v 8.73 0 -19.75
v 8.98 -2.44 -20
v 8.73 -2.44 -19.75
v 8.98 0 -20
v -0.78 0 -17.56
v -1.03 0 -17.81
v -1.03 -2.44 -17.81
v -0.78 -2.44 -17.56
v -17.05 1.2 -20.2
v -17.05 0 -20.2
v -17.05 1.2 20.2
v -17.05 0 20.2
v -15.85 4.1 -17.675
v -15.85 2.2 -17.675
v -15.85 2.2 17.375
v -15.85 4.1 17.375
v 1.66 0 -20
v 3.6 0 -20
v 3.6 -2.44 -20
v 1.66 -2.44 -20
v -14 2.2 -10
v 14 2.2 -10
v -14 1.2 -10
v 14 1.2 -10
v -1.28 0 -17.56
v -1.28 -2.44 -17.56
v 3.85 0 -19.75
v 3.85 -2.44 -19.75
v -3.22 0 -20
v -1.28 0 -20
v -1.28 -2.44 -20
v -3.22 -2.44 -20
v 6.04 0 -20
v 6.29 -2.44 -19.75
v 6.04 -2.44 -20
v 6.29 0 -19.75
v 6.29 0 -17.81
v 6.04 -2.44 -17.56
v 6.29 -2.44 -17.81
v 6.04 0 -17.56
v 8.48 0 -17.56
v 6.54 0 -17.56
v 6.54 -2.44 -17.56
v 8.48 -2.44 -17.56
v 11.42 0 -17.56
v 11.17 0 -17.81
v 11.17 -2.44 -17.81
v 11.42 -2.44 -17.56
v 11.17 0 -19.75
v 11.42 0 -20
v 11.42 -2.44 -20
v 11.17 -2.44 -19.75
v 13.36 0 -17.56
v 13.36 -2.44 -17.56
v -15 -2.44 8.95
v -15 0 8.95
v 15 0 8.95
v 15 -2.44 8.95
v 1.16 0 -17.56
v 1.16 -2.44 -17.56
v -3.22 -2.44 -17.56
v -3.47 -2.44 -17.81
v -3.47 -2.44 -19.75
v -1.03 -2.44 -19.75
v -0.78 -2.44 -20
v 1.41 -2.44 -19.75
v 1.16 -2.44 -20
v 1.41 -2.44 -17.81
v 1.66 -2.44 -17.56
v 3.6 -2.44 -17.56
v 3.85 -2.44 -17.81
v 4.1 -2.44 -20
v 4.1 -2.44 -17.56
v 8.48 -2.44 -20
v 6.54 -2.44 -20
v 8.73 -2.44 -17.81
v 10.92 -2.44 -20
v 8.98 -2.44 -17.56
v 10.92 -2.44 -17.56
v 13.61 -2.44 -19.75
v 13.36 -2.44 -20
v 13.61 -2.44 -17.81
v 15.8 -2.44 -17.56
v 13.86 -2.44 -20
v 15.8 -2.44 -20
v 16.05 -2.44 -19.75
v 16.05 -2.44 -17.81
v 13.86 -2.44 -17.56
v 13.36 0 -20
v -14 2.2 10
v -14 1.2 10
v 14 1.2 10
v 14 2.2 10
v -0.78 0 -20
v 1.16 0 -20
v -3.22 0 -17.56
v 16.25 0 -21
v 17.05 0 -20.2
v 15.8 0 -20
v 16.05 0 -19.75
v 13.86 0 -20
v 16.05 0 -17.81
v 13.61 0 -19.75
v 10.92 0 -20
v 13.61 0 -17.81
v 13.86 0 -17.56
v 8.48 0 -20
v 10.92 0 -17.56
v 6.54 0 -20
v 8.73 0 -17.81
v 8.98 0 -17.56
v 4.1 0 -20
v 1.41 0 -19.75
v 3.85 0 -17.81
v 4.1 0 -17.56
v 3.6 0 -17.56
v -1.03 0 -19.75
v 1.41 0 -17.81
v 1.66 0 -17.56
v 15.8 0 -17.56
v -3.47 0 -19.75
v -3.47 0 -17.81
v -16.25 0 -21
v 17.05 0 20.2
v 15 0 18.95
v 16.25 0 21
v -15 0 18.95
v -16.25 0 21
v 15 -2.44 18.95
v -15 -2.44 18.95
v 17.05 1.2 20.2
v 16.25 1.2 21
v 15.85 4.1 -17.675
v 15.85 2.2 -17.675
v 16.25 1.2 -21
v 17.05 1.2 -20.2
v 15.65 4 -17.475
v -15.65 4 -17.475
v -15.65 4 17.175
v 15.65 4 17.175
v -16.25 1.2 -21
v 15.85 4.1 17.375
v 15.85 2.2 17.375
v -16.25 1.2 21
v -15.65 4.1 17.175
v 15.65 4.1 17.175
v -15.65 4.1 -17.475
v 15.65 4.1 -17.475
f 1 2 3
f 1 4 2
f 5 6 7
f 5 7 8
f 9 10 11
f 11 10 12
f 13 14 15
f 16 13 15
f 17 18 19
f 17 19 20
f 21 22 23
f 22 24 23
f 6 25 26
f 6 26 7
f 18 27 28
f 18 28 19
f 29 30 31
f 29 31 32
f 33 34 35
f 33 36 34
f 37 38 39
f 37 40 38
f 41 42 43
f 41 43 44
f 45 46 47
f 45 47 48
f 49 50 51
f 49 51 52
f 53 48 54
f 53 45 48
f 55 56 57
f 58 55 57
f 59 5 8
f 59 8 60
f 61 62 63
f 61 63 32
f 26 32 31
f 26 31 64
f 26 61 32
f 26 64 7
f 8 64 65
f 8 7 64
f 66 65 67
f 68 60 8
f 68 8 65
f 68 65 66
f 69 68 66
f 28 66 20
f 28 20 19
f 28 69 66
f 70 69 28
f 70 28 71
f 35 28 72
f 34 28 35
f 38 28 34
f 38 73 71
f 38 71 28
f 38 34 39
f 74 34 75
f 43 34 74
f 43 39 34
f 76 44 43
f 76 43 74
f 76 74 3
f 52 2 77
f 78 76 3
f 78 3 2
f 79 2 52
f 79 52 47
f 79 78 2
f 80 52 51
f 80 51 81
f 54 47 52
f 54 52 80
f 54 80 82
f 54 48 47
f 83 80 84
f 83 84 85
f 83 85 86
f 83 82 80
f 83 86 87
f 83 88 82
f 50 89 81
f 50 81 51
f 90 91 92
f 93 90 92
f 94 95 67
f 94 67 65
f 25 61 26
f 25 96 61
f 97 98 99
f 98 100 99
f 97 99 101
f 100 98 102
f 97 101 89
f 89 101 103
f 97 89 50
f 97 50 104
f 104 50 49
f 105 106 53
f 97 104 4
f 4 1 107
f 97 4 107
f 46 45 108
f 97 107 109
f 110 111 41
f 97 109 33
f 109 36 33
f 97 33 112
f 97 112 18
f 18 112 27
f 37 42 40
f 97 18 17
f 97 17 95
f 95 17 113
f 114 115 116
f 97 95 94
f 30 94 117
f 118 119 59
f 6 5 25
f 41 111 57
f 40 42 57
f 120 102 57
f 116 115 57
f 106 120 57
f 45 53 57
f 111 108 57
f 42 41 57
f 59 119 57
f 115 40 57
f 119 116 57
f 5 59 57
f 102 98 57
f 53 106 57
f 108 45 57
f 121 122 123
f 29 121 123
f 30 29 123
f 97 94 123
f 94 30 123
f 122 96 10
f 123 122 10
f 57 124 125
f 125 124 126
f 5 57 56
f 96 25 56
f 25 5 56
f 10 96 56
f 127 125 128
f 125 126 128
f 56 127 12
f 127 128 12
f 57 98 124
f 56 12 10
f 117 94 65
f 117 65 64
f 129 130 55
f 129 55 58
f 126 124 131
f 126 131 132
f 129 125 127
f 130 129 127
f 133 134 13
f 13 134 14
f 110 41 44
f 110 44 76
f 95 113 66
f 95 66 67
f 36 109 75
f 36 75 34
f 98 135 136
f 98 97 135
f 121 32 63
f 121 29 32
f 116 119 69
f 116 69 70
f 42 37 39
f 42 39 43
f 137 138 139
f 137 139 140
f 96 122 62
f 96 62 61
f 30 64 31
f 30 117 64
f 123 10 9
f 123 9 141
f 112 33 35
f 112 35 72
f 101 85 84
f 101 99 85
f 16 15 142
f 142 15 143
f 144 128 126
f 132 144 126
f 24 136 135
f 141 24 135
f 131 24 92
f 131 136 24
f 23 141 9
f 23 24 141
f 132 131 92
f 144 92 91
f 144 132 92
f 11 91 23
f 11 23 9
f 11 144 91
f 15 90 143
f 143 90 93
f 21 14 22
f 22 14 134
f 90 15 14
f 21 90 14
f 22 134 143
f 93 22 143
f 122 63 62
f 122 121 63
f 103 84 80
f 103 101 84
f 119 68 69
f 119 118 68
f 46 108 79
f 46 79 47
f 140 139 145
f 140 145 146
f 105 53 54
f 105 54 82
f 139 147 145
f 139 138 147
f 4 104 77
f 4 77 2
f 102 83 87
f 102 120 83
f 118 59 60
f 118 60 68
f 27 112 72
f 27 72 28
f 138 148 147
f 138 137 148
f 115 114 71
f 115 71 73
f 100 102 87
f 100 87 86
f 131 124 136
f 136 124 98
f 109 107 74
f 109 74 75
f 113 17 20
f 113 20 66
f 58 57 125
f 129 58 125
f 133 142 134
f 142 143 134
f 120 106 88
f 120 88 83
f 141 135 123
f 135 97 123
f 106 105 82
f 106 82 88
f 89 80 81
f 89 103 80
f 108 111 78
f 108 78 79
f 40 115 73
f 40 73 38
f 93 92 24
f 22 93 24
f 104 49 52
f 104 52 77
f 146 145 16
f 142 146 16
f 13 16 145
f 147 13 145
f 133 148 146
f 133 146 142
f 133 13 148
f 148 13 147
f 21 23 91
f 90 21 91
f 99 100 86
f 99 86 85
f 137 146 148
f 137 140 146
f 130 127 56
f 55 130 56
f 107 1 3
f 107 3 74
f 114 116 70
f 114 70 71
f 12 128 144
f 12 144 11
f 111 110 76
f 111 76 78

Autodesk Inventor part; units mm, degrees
ref_plane "YZ Plane" through (0, 0, 0) normal (1, 0, 0) x (0, 1, 0)
sketch "Sketch1" plane through (0, 0, 0) normal (0, 1, 0) x (-1, 0, 0)
  line L0 (16.25, 21) -> (-16.25, 21)
  line L1 (-17.05, 20.2) -> (-17.05, -20.2)
  line L2 (-16.25, -21) -> (16.25, -21)
  line L3 (17.05, -20.2) -> (17.05, 20.2)
  line L4 (17.05, 21) -> (-17.05, -21) construction
  line L5 (-17.05, 21) -> (17.05, -21) construction
  line L6 (16.25, 21) -> (17.05, 20.2)
  line L7 (17.05, -20.2) -> (16.25, -21)
  line L8 (-16.25, -21) -> (-17.05, -20.2)
  line L9 (-17.05, 20.2) -> (-16.25, 21)
  point P0 (0, 0)
  dimension "d0" = 34.1
  dimension "d1" = 42
  dimension "d4" = 0.8
  dimension "d5" = 0.8
  dimension "d6" = 0.8
  dimension "d7" = 0.8
  dimension "d8" = 0.8
  dimension "d9" = 0.8
  dimension "d10" = 0.8
  dimension "d11" = 0.8
extrude "Extrusion1" add sketch "Sketch1" along normal blind 1.2
ref_plane "Work Plane1" through (0, 2.2, 0) normal (0, 1, 0) x (1, 0, 0)
sketch "Sketch2" plane through (0, 2.2, 0) normal (0, 1, 0) x (1, 0, 0)
  line L0 (-15.85, -17.375) -> (15.85, -17.375)
  line L1 (15.85, -17.375) -> (15.85, 17.675)
  line L2 (15.85, 17.675) -> (-15.85, 17.675)
  line L3 (-15.85, 17.675) -> (-15.85, -17.375)
  line L4 (-15.85, -17.375) -> (15.85, 17.675) construction
  line L5 (15.85, -17.375) -> (-15.85, 17.675) construction
  point P0 (0, 0.15)
  dimension "d13" = 31.7
  dimension "d14" = 35.05
extrude "Extrusion2" add sketch "Sketch2" along normal blind 1.8
sketch "Sketch3" plane through (0, 4, 0) normal (0, 1, 0) x (1, 0, 0)
  line L0 (-15.85, -17.375) -> (15.85, -17.375) projected
  line L1 (15.85, -17.375) -> (15.85, 17.675) projected
  line L2 (15.85, 17.675) -> (-15.85, 17.675) projected
  line L3 (-15.85, 17.675) -> (-15.85, -17.375) projected
  line L4 (-15.65, -17.175) -> (15.65, -17.175)
  line L5 (15.65, -17.175) -> (15.65, 17.475)
  line L6 (15.65, 17.475) -> (-15.65, 17.475)
  line L7 (-15.65, 17.475) -> (-15.65, -17.175)
  point P0 (0, 0)
  dimension "d17" = 0.2
extrude "Extrusion3" add sketch "Sketch3" along normal blind 0.1
sketch "Sketch4" plane through (0, 1.2, 0) normal (0, 1, 0) x (1, 0, 0)
  line L0 (-14, -10) -> (14, -10)
  line L1 (14, -10) -> (14, 10)
  line L2 (14, 10) -> (-14, 10)
  line L3 (-14, 10) -> (-14, -10)
  line L4 (-14, -10) -> (14, 10) construction
  line L5 (14, -10) -> (-14, 10) construction
  point P0 (0, 0)
  dimension "d20" = 28
  dimension "d21" = 20
extrude "Extrusion4" add sketch "Sketch4" along normal up to surface (1 mm away)
sketch "Sketch5" plane through (0, 0, 0) normal (0, -1, 0) x (1, 0, 0)
  line L0 (15.8, -20) -> (13.86, -20)
  line L1 (13.61, -19.75) -> (13.61, -17.81)
  line L2 (13.86, -17.56) -> (15.8, -17.56)
  line L3 (16.05, -17.81) -> (16.05, -19.75)
  line L4 (16.05, -19.75) -> (15.8, -20)
  line L5 (13.86, -20) -> (13.61, -19.75)
  line L6 (13.61, -17.81) -> (13.86, -17.56)
  line L7 (15.8, -17.56) -> (16.05, -17.81)
  line L8 (13.36, -20) -> (11.42, -20)
  line L9 (11.17, -19.75) -> (11.17, -17.81)
  line L10 (11.42, -17.56) -> (13.36, -17.56)
  line L11 (13.61, -17.81) -> (13.61, -19.75)
  line L12 (13.61, -19.75) -> (13.36, -20)
  line L13 (11.42, -20) -> (11.17, -19.75)
  line L14 (11.17, -17.81) -> (11.42, -17.56)
  line L15 (13.36, -17.56) -> (13.61, -17.81)
  line L16 (10.92, -20) -> (8.98, -20)
  line L17 (8.73, -19.75) -> (8.73, -17.81)
  line L18 (8.98, -17.56) -> (10.92, -17.56)
  line L19 (11.17, -17.81) -> (11.17, -19.75)
  line L20 (11.17, -19.75) -> (10.92, -20)
  line L21 (8.98, -20) -> (8.73, -19.75)
  line L22 (8.73, -17.81) -> (8.98, -17.56)
  line L23 (10.92, -17.56) -> (11.17, -17.81)
  line L24 (8.48, -20) -> (6.54, -20)
  line L25 (6.29, -19.75) -> (6.29, -17.81)
  line L26 (6.54, -17.56) -> (8.48, -17.56)
  line L27 (8.73, -17.81) -> (8.73, -19.75)
  line L28 (8.73, -19.75) -> (8.48, -20)
  line L29 (6.54, -20) -> (6.29, -19.75)
  line L30 (6.29, -17.81) -> (6.54, -17.56)
  line L31 (8.48, -17.56) -> (8.73, -17.81)
  line L32 (6.04, -20) -> (4.1, -20)
  line L33 (3.85, -19.75) -> (3.85, -17.81)
  line L34 (4.1, -17.56) -> (6.04, -17.56)
  line L35 (6.29, -17.81) -> (6.29, -19.75)
  line L36 (6.29, -19.75) -> (6.04, -20)
  line L37 (4.1, -20) -> (3.85, -19.75)
  line L38 (3.85, -17.81) -> (4.1, -17.56)
  line L39 (6.04, -17.56) -> (6.29, -17.81)
  line L40 (3.6, -20) -> (1.66, -20)
  line L41 (1.41, -19.75) -> (1.41, -17.81)
  line L42 (1.66, -17.56) -> (3.6, -17.56)
  line L43 (3.85, -17.81) -> (3.85, -19.75)
  line L44 (3.85, -19.75) -> (3.6, -20)
  line L45 (1.66, -20) -> (1.41, -19.75)
  line L46 (1.41, -17.81) -> (1.66, -17.56)
  line L47 (3.6, -17.56) -> (3.85, -17.81)
  line L48 (1.16, -20) -> (-0.78, -20)
  line L49 (-1.03, -19.75) -> (-1.03, -17.81)
  line L50 (-0.78, -17.56) -> (1.16, -17.56)
  line L51 (1.41, -17.81) -> (1.41, -19.75)
  line L52 (1.41, -19.75) -> (1.16, -20)
  line L53 (-0.78, -20) -> (-1.03, -19.75)
  line L54 (-1.03, -17.81) -> (-0.78, -17.56)
  line L55 (1.16, -17.56) -> (1.41, -17.81)
  line L56 (-1.28, -20) -> (-3.22, -20)
  line L57 (-3.47, -19.75) -> (-3.47, -17.81)
  line L58 (-3.22, -17.56) -> (-1.28, -17.56)
  line L59 (-1.03, -17.81) -> (-1.03, -19.75)
  line L60 (-1.03, -19.75) -> (-1.28, -20)
  line L61 (-3.22, -20) -> (-3.47, -19.75)
  line L62 (-3.47, -17.81) -> (-3.22, -17.56)
  line L63 (-1.28, -17.56) -> (-1.03, -17.81)
  point P0 (16.05, -20)
  point P1 (13.61, -17.56)
  point P2 (13.61, -20)
  point P3 (16.05, -17.56)
  point P4 (13.61, -20)
  point P5 (11.17, -17.56)
  point P6 (11.17, -20)
  point P7 (13.61, -17.56)
  point P8 (11.17, -20)
  point P9 (8.73, -17.56)
  point P10 (8.73, -20)
  point P11 (11.17, -17.56)
  point P12 (8.73, -20)
  point P13 (6.29, -17.56)
  point P14 (6.29, -20)
  point P15 (8.73, -17.56)
  point P16 (6.29, -20)
  point P17 (3.85, -17.56)
  point P18 (3.85, -20)
  point P19 (6.29, -17.56)
  point P20 (3.85, -20)
  point P21 (1.41, -17.56)
  point P22 (1.41, -20)
  point P23 (3.85, -17.56)
  point P24 (1.41, -20)
  point P25 (-1.03, -17.56)
  point P26 (-1.03, -20)
  point P27 (1.41, -17.56)
  point P28 (-1.03, -20)
  point P29 (-3.47, -17.56)
  point P30 (-3.47, -20)
  point P31 (-1.03, -17.56)
  dimension "d42" = 2.44
extrude "Extrusion5" add sketch "Sketch5" along normal blind 2.44
sketch "Sketch6" plane through (0, 0, 0) normal (0, -1, 0) x (1, 0, 0)
  line L0 (-15, 8.95) -> (15, 8.95)
  line L1 (15, 8.95) -> (15, 18.95)
  line L2 (15, 18.95) -> (-15, 18.95)
  line L3 (-15, 18.95) -> (-15, 8.95)
  line L4 (-15, 8.95) -> (15, 18.95) construction
  line L5 (15, 8.95) -> (-15, 18.95) construction
  line L6 (-16.25, 21) -> (16.25, 21) projected
  line L7 (0, 21) -> (0, 18.95)
  point P0 (0, 0)
  point P1 (0, 18.95)
  dimension "d49" = 30
  dimension "d50" = 10
  dimension "d51" = 2.05
ref_plane "Work Plane2" through (-19.708, -2.44, -51.7905) normal (0, 1, 0) x (0, 0, 1)
extrude "Extrusion6" add sketch "Sketch6" along normal up to surface (2.44 mm away)
equation "\"d5\" = d4"
equation "\"d6\" = d4"
equation "\"d7\" = d6"
equation "\"d8\" = d4"
equation "\"d9\" = d8"
equation "\"d10\" = d4"
equation "\"d11\" = d10"
properties part number "Display"
